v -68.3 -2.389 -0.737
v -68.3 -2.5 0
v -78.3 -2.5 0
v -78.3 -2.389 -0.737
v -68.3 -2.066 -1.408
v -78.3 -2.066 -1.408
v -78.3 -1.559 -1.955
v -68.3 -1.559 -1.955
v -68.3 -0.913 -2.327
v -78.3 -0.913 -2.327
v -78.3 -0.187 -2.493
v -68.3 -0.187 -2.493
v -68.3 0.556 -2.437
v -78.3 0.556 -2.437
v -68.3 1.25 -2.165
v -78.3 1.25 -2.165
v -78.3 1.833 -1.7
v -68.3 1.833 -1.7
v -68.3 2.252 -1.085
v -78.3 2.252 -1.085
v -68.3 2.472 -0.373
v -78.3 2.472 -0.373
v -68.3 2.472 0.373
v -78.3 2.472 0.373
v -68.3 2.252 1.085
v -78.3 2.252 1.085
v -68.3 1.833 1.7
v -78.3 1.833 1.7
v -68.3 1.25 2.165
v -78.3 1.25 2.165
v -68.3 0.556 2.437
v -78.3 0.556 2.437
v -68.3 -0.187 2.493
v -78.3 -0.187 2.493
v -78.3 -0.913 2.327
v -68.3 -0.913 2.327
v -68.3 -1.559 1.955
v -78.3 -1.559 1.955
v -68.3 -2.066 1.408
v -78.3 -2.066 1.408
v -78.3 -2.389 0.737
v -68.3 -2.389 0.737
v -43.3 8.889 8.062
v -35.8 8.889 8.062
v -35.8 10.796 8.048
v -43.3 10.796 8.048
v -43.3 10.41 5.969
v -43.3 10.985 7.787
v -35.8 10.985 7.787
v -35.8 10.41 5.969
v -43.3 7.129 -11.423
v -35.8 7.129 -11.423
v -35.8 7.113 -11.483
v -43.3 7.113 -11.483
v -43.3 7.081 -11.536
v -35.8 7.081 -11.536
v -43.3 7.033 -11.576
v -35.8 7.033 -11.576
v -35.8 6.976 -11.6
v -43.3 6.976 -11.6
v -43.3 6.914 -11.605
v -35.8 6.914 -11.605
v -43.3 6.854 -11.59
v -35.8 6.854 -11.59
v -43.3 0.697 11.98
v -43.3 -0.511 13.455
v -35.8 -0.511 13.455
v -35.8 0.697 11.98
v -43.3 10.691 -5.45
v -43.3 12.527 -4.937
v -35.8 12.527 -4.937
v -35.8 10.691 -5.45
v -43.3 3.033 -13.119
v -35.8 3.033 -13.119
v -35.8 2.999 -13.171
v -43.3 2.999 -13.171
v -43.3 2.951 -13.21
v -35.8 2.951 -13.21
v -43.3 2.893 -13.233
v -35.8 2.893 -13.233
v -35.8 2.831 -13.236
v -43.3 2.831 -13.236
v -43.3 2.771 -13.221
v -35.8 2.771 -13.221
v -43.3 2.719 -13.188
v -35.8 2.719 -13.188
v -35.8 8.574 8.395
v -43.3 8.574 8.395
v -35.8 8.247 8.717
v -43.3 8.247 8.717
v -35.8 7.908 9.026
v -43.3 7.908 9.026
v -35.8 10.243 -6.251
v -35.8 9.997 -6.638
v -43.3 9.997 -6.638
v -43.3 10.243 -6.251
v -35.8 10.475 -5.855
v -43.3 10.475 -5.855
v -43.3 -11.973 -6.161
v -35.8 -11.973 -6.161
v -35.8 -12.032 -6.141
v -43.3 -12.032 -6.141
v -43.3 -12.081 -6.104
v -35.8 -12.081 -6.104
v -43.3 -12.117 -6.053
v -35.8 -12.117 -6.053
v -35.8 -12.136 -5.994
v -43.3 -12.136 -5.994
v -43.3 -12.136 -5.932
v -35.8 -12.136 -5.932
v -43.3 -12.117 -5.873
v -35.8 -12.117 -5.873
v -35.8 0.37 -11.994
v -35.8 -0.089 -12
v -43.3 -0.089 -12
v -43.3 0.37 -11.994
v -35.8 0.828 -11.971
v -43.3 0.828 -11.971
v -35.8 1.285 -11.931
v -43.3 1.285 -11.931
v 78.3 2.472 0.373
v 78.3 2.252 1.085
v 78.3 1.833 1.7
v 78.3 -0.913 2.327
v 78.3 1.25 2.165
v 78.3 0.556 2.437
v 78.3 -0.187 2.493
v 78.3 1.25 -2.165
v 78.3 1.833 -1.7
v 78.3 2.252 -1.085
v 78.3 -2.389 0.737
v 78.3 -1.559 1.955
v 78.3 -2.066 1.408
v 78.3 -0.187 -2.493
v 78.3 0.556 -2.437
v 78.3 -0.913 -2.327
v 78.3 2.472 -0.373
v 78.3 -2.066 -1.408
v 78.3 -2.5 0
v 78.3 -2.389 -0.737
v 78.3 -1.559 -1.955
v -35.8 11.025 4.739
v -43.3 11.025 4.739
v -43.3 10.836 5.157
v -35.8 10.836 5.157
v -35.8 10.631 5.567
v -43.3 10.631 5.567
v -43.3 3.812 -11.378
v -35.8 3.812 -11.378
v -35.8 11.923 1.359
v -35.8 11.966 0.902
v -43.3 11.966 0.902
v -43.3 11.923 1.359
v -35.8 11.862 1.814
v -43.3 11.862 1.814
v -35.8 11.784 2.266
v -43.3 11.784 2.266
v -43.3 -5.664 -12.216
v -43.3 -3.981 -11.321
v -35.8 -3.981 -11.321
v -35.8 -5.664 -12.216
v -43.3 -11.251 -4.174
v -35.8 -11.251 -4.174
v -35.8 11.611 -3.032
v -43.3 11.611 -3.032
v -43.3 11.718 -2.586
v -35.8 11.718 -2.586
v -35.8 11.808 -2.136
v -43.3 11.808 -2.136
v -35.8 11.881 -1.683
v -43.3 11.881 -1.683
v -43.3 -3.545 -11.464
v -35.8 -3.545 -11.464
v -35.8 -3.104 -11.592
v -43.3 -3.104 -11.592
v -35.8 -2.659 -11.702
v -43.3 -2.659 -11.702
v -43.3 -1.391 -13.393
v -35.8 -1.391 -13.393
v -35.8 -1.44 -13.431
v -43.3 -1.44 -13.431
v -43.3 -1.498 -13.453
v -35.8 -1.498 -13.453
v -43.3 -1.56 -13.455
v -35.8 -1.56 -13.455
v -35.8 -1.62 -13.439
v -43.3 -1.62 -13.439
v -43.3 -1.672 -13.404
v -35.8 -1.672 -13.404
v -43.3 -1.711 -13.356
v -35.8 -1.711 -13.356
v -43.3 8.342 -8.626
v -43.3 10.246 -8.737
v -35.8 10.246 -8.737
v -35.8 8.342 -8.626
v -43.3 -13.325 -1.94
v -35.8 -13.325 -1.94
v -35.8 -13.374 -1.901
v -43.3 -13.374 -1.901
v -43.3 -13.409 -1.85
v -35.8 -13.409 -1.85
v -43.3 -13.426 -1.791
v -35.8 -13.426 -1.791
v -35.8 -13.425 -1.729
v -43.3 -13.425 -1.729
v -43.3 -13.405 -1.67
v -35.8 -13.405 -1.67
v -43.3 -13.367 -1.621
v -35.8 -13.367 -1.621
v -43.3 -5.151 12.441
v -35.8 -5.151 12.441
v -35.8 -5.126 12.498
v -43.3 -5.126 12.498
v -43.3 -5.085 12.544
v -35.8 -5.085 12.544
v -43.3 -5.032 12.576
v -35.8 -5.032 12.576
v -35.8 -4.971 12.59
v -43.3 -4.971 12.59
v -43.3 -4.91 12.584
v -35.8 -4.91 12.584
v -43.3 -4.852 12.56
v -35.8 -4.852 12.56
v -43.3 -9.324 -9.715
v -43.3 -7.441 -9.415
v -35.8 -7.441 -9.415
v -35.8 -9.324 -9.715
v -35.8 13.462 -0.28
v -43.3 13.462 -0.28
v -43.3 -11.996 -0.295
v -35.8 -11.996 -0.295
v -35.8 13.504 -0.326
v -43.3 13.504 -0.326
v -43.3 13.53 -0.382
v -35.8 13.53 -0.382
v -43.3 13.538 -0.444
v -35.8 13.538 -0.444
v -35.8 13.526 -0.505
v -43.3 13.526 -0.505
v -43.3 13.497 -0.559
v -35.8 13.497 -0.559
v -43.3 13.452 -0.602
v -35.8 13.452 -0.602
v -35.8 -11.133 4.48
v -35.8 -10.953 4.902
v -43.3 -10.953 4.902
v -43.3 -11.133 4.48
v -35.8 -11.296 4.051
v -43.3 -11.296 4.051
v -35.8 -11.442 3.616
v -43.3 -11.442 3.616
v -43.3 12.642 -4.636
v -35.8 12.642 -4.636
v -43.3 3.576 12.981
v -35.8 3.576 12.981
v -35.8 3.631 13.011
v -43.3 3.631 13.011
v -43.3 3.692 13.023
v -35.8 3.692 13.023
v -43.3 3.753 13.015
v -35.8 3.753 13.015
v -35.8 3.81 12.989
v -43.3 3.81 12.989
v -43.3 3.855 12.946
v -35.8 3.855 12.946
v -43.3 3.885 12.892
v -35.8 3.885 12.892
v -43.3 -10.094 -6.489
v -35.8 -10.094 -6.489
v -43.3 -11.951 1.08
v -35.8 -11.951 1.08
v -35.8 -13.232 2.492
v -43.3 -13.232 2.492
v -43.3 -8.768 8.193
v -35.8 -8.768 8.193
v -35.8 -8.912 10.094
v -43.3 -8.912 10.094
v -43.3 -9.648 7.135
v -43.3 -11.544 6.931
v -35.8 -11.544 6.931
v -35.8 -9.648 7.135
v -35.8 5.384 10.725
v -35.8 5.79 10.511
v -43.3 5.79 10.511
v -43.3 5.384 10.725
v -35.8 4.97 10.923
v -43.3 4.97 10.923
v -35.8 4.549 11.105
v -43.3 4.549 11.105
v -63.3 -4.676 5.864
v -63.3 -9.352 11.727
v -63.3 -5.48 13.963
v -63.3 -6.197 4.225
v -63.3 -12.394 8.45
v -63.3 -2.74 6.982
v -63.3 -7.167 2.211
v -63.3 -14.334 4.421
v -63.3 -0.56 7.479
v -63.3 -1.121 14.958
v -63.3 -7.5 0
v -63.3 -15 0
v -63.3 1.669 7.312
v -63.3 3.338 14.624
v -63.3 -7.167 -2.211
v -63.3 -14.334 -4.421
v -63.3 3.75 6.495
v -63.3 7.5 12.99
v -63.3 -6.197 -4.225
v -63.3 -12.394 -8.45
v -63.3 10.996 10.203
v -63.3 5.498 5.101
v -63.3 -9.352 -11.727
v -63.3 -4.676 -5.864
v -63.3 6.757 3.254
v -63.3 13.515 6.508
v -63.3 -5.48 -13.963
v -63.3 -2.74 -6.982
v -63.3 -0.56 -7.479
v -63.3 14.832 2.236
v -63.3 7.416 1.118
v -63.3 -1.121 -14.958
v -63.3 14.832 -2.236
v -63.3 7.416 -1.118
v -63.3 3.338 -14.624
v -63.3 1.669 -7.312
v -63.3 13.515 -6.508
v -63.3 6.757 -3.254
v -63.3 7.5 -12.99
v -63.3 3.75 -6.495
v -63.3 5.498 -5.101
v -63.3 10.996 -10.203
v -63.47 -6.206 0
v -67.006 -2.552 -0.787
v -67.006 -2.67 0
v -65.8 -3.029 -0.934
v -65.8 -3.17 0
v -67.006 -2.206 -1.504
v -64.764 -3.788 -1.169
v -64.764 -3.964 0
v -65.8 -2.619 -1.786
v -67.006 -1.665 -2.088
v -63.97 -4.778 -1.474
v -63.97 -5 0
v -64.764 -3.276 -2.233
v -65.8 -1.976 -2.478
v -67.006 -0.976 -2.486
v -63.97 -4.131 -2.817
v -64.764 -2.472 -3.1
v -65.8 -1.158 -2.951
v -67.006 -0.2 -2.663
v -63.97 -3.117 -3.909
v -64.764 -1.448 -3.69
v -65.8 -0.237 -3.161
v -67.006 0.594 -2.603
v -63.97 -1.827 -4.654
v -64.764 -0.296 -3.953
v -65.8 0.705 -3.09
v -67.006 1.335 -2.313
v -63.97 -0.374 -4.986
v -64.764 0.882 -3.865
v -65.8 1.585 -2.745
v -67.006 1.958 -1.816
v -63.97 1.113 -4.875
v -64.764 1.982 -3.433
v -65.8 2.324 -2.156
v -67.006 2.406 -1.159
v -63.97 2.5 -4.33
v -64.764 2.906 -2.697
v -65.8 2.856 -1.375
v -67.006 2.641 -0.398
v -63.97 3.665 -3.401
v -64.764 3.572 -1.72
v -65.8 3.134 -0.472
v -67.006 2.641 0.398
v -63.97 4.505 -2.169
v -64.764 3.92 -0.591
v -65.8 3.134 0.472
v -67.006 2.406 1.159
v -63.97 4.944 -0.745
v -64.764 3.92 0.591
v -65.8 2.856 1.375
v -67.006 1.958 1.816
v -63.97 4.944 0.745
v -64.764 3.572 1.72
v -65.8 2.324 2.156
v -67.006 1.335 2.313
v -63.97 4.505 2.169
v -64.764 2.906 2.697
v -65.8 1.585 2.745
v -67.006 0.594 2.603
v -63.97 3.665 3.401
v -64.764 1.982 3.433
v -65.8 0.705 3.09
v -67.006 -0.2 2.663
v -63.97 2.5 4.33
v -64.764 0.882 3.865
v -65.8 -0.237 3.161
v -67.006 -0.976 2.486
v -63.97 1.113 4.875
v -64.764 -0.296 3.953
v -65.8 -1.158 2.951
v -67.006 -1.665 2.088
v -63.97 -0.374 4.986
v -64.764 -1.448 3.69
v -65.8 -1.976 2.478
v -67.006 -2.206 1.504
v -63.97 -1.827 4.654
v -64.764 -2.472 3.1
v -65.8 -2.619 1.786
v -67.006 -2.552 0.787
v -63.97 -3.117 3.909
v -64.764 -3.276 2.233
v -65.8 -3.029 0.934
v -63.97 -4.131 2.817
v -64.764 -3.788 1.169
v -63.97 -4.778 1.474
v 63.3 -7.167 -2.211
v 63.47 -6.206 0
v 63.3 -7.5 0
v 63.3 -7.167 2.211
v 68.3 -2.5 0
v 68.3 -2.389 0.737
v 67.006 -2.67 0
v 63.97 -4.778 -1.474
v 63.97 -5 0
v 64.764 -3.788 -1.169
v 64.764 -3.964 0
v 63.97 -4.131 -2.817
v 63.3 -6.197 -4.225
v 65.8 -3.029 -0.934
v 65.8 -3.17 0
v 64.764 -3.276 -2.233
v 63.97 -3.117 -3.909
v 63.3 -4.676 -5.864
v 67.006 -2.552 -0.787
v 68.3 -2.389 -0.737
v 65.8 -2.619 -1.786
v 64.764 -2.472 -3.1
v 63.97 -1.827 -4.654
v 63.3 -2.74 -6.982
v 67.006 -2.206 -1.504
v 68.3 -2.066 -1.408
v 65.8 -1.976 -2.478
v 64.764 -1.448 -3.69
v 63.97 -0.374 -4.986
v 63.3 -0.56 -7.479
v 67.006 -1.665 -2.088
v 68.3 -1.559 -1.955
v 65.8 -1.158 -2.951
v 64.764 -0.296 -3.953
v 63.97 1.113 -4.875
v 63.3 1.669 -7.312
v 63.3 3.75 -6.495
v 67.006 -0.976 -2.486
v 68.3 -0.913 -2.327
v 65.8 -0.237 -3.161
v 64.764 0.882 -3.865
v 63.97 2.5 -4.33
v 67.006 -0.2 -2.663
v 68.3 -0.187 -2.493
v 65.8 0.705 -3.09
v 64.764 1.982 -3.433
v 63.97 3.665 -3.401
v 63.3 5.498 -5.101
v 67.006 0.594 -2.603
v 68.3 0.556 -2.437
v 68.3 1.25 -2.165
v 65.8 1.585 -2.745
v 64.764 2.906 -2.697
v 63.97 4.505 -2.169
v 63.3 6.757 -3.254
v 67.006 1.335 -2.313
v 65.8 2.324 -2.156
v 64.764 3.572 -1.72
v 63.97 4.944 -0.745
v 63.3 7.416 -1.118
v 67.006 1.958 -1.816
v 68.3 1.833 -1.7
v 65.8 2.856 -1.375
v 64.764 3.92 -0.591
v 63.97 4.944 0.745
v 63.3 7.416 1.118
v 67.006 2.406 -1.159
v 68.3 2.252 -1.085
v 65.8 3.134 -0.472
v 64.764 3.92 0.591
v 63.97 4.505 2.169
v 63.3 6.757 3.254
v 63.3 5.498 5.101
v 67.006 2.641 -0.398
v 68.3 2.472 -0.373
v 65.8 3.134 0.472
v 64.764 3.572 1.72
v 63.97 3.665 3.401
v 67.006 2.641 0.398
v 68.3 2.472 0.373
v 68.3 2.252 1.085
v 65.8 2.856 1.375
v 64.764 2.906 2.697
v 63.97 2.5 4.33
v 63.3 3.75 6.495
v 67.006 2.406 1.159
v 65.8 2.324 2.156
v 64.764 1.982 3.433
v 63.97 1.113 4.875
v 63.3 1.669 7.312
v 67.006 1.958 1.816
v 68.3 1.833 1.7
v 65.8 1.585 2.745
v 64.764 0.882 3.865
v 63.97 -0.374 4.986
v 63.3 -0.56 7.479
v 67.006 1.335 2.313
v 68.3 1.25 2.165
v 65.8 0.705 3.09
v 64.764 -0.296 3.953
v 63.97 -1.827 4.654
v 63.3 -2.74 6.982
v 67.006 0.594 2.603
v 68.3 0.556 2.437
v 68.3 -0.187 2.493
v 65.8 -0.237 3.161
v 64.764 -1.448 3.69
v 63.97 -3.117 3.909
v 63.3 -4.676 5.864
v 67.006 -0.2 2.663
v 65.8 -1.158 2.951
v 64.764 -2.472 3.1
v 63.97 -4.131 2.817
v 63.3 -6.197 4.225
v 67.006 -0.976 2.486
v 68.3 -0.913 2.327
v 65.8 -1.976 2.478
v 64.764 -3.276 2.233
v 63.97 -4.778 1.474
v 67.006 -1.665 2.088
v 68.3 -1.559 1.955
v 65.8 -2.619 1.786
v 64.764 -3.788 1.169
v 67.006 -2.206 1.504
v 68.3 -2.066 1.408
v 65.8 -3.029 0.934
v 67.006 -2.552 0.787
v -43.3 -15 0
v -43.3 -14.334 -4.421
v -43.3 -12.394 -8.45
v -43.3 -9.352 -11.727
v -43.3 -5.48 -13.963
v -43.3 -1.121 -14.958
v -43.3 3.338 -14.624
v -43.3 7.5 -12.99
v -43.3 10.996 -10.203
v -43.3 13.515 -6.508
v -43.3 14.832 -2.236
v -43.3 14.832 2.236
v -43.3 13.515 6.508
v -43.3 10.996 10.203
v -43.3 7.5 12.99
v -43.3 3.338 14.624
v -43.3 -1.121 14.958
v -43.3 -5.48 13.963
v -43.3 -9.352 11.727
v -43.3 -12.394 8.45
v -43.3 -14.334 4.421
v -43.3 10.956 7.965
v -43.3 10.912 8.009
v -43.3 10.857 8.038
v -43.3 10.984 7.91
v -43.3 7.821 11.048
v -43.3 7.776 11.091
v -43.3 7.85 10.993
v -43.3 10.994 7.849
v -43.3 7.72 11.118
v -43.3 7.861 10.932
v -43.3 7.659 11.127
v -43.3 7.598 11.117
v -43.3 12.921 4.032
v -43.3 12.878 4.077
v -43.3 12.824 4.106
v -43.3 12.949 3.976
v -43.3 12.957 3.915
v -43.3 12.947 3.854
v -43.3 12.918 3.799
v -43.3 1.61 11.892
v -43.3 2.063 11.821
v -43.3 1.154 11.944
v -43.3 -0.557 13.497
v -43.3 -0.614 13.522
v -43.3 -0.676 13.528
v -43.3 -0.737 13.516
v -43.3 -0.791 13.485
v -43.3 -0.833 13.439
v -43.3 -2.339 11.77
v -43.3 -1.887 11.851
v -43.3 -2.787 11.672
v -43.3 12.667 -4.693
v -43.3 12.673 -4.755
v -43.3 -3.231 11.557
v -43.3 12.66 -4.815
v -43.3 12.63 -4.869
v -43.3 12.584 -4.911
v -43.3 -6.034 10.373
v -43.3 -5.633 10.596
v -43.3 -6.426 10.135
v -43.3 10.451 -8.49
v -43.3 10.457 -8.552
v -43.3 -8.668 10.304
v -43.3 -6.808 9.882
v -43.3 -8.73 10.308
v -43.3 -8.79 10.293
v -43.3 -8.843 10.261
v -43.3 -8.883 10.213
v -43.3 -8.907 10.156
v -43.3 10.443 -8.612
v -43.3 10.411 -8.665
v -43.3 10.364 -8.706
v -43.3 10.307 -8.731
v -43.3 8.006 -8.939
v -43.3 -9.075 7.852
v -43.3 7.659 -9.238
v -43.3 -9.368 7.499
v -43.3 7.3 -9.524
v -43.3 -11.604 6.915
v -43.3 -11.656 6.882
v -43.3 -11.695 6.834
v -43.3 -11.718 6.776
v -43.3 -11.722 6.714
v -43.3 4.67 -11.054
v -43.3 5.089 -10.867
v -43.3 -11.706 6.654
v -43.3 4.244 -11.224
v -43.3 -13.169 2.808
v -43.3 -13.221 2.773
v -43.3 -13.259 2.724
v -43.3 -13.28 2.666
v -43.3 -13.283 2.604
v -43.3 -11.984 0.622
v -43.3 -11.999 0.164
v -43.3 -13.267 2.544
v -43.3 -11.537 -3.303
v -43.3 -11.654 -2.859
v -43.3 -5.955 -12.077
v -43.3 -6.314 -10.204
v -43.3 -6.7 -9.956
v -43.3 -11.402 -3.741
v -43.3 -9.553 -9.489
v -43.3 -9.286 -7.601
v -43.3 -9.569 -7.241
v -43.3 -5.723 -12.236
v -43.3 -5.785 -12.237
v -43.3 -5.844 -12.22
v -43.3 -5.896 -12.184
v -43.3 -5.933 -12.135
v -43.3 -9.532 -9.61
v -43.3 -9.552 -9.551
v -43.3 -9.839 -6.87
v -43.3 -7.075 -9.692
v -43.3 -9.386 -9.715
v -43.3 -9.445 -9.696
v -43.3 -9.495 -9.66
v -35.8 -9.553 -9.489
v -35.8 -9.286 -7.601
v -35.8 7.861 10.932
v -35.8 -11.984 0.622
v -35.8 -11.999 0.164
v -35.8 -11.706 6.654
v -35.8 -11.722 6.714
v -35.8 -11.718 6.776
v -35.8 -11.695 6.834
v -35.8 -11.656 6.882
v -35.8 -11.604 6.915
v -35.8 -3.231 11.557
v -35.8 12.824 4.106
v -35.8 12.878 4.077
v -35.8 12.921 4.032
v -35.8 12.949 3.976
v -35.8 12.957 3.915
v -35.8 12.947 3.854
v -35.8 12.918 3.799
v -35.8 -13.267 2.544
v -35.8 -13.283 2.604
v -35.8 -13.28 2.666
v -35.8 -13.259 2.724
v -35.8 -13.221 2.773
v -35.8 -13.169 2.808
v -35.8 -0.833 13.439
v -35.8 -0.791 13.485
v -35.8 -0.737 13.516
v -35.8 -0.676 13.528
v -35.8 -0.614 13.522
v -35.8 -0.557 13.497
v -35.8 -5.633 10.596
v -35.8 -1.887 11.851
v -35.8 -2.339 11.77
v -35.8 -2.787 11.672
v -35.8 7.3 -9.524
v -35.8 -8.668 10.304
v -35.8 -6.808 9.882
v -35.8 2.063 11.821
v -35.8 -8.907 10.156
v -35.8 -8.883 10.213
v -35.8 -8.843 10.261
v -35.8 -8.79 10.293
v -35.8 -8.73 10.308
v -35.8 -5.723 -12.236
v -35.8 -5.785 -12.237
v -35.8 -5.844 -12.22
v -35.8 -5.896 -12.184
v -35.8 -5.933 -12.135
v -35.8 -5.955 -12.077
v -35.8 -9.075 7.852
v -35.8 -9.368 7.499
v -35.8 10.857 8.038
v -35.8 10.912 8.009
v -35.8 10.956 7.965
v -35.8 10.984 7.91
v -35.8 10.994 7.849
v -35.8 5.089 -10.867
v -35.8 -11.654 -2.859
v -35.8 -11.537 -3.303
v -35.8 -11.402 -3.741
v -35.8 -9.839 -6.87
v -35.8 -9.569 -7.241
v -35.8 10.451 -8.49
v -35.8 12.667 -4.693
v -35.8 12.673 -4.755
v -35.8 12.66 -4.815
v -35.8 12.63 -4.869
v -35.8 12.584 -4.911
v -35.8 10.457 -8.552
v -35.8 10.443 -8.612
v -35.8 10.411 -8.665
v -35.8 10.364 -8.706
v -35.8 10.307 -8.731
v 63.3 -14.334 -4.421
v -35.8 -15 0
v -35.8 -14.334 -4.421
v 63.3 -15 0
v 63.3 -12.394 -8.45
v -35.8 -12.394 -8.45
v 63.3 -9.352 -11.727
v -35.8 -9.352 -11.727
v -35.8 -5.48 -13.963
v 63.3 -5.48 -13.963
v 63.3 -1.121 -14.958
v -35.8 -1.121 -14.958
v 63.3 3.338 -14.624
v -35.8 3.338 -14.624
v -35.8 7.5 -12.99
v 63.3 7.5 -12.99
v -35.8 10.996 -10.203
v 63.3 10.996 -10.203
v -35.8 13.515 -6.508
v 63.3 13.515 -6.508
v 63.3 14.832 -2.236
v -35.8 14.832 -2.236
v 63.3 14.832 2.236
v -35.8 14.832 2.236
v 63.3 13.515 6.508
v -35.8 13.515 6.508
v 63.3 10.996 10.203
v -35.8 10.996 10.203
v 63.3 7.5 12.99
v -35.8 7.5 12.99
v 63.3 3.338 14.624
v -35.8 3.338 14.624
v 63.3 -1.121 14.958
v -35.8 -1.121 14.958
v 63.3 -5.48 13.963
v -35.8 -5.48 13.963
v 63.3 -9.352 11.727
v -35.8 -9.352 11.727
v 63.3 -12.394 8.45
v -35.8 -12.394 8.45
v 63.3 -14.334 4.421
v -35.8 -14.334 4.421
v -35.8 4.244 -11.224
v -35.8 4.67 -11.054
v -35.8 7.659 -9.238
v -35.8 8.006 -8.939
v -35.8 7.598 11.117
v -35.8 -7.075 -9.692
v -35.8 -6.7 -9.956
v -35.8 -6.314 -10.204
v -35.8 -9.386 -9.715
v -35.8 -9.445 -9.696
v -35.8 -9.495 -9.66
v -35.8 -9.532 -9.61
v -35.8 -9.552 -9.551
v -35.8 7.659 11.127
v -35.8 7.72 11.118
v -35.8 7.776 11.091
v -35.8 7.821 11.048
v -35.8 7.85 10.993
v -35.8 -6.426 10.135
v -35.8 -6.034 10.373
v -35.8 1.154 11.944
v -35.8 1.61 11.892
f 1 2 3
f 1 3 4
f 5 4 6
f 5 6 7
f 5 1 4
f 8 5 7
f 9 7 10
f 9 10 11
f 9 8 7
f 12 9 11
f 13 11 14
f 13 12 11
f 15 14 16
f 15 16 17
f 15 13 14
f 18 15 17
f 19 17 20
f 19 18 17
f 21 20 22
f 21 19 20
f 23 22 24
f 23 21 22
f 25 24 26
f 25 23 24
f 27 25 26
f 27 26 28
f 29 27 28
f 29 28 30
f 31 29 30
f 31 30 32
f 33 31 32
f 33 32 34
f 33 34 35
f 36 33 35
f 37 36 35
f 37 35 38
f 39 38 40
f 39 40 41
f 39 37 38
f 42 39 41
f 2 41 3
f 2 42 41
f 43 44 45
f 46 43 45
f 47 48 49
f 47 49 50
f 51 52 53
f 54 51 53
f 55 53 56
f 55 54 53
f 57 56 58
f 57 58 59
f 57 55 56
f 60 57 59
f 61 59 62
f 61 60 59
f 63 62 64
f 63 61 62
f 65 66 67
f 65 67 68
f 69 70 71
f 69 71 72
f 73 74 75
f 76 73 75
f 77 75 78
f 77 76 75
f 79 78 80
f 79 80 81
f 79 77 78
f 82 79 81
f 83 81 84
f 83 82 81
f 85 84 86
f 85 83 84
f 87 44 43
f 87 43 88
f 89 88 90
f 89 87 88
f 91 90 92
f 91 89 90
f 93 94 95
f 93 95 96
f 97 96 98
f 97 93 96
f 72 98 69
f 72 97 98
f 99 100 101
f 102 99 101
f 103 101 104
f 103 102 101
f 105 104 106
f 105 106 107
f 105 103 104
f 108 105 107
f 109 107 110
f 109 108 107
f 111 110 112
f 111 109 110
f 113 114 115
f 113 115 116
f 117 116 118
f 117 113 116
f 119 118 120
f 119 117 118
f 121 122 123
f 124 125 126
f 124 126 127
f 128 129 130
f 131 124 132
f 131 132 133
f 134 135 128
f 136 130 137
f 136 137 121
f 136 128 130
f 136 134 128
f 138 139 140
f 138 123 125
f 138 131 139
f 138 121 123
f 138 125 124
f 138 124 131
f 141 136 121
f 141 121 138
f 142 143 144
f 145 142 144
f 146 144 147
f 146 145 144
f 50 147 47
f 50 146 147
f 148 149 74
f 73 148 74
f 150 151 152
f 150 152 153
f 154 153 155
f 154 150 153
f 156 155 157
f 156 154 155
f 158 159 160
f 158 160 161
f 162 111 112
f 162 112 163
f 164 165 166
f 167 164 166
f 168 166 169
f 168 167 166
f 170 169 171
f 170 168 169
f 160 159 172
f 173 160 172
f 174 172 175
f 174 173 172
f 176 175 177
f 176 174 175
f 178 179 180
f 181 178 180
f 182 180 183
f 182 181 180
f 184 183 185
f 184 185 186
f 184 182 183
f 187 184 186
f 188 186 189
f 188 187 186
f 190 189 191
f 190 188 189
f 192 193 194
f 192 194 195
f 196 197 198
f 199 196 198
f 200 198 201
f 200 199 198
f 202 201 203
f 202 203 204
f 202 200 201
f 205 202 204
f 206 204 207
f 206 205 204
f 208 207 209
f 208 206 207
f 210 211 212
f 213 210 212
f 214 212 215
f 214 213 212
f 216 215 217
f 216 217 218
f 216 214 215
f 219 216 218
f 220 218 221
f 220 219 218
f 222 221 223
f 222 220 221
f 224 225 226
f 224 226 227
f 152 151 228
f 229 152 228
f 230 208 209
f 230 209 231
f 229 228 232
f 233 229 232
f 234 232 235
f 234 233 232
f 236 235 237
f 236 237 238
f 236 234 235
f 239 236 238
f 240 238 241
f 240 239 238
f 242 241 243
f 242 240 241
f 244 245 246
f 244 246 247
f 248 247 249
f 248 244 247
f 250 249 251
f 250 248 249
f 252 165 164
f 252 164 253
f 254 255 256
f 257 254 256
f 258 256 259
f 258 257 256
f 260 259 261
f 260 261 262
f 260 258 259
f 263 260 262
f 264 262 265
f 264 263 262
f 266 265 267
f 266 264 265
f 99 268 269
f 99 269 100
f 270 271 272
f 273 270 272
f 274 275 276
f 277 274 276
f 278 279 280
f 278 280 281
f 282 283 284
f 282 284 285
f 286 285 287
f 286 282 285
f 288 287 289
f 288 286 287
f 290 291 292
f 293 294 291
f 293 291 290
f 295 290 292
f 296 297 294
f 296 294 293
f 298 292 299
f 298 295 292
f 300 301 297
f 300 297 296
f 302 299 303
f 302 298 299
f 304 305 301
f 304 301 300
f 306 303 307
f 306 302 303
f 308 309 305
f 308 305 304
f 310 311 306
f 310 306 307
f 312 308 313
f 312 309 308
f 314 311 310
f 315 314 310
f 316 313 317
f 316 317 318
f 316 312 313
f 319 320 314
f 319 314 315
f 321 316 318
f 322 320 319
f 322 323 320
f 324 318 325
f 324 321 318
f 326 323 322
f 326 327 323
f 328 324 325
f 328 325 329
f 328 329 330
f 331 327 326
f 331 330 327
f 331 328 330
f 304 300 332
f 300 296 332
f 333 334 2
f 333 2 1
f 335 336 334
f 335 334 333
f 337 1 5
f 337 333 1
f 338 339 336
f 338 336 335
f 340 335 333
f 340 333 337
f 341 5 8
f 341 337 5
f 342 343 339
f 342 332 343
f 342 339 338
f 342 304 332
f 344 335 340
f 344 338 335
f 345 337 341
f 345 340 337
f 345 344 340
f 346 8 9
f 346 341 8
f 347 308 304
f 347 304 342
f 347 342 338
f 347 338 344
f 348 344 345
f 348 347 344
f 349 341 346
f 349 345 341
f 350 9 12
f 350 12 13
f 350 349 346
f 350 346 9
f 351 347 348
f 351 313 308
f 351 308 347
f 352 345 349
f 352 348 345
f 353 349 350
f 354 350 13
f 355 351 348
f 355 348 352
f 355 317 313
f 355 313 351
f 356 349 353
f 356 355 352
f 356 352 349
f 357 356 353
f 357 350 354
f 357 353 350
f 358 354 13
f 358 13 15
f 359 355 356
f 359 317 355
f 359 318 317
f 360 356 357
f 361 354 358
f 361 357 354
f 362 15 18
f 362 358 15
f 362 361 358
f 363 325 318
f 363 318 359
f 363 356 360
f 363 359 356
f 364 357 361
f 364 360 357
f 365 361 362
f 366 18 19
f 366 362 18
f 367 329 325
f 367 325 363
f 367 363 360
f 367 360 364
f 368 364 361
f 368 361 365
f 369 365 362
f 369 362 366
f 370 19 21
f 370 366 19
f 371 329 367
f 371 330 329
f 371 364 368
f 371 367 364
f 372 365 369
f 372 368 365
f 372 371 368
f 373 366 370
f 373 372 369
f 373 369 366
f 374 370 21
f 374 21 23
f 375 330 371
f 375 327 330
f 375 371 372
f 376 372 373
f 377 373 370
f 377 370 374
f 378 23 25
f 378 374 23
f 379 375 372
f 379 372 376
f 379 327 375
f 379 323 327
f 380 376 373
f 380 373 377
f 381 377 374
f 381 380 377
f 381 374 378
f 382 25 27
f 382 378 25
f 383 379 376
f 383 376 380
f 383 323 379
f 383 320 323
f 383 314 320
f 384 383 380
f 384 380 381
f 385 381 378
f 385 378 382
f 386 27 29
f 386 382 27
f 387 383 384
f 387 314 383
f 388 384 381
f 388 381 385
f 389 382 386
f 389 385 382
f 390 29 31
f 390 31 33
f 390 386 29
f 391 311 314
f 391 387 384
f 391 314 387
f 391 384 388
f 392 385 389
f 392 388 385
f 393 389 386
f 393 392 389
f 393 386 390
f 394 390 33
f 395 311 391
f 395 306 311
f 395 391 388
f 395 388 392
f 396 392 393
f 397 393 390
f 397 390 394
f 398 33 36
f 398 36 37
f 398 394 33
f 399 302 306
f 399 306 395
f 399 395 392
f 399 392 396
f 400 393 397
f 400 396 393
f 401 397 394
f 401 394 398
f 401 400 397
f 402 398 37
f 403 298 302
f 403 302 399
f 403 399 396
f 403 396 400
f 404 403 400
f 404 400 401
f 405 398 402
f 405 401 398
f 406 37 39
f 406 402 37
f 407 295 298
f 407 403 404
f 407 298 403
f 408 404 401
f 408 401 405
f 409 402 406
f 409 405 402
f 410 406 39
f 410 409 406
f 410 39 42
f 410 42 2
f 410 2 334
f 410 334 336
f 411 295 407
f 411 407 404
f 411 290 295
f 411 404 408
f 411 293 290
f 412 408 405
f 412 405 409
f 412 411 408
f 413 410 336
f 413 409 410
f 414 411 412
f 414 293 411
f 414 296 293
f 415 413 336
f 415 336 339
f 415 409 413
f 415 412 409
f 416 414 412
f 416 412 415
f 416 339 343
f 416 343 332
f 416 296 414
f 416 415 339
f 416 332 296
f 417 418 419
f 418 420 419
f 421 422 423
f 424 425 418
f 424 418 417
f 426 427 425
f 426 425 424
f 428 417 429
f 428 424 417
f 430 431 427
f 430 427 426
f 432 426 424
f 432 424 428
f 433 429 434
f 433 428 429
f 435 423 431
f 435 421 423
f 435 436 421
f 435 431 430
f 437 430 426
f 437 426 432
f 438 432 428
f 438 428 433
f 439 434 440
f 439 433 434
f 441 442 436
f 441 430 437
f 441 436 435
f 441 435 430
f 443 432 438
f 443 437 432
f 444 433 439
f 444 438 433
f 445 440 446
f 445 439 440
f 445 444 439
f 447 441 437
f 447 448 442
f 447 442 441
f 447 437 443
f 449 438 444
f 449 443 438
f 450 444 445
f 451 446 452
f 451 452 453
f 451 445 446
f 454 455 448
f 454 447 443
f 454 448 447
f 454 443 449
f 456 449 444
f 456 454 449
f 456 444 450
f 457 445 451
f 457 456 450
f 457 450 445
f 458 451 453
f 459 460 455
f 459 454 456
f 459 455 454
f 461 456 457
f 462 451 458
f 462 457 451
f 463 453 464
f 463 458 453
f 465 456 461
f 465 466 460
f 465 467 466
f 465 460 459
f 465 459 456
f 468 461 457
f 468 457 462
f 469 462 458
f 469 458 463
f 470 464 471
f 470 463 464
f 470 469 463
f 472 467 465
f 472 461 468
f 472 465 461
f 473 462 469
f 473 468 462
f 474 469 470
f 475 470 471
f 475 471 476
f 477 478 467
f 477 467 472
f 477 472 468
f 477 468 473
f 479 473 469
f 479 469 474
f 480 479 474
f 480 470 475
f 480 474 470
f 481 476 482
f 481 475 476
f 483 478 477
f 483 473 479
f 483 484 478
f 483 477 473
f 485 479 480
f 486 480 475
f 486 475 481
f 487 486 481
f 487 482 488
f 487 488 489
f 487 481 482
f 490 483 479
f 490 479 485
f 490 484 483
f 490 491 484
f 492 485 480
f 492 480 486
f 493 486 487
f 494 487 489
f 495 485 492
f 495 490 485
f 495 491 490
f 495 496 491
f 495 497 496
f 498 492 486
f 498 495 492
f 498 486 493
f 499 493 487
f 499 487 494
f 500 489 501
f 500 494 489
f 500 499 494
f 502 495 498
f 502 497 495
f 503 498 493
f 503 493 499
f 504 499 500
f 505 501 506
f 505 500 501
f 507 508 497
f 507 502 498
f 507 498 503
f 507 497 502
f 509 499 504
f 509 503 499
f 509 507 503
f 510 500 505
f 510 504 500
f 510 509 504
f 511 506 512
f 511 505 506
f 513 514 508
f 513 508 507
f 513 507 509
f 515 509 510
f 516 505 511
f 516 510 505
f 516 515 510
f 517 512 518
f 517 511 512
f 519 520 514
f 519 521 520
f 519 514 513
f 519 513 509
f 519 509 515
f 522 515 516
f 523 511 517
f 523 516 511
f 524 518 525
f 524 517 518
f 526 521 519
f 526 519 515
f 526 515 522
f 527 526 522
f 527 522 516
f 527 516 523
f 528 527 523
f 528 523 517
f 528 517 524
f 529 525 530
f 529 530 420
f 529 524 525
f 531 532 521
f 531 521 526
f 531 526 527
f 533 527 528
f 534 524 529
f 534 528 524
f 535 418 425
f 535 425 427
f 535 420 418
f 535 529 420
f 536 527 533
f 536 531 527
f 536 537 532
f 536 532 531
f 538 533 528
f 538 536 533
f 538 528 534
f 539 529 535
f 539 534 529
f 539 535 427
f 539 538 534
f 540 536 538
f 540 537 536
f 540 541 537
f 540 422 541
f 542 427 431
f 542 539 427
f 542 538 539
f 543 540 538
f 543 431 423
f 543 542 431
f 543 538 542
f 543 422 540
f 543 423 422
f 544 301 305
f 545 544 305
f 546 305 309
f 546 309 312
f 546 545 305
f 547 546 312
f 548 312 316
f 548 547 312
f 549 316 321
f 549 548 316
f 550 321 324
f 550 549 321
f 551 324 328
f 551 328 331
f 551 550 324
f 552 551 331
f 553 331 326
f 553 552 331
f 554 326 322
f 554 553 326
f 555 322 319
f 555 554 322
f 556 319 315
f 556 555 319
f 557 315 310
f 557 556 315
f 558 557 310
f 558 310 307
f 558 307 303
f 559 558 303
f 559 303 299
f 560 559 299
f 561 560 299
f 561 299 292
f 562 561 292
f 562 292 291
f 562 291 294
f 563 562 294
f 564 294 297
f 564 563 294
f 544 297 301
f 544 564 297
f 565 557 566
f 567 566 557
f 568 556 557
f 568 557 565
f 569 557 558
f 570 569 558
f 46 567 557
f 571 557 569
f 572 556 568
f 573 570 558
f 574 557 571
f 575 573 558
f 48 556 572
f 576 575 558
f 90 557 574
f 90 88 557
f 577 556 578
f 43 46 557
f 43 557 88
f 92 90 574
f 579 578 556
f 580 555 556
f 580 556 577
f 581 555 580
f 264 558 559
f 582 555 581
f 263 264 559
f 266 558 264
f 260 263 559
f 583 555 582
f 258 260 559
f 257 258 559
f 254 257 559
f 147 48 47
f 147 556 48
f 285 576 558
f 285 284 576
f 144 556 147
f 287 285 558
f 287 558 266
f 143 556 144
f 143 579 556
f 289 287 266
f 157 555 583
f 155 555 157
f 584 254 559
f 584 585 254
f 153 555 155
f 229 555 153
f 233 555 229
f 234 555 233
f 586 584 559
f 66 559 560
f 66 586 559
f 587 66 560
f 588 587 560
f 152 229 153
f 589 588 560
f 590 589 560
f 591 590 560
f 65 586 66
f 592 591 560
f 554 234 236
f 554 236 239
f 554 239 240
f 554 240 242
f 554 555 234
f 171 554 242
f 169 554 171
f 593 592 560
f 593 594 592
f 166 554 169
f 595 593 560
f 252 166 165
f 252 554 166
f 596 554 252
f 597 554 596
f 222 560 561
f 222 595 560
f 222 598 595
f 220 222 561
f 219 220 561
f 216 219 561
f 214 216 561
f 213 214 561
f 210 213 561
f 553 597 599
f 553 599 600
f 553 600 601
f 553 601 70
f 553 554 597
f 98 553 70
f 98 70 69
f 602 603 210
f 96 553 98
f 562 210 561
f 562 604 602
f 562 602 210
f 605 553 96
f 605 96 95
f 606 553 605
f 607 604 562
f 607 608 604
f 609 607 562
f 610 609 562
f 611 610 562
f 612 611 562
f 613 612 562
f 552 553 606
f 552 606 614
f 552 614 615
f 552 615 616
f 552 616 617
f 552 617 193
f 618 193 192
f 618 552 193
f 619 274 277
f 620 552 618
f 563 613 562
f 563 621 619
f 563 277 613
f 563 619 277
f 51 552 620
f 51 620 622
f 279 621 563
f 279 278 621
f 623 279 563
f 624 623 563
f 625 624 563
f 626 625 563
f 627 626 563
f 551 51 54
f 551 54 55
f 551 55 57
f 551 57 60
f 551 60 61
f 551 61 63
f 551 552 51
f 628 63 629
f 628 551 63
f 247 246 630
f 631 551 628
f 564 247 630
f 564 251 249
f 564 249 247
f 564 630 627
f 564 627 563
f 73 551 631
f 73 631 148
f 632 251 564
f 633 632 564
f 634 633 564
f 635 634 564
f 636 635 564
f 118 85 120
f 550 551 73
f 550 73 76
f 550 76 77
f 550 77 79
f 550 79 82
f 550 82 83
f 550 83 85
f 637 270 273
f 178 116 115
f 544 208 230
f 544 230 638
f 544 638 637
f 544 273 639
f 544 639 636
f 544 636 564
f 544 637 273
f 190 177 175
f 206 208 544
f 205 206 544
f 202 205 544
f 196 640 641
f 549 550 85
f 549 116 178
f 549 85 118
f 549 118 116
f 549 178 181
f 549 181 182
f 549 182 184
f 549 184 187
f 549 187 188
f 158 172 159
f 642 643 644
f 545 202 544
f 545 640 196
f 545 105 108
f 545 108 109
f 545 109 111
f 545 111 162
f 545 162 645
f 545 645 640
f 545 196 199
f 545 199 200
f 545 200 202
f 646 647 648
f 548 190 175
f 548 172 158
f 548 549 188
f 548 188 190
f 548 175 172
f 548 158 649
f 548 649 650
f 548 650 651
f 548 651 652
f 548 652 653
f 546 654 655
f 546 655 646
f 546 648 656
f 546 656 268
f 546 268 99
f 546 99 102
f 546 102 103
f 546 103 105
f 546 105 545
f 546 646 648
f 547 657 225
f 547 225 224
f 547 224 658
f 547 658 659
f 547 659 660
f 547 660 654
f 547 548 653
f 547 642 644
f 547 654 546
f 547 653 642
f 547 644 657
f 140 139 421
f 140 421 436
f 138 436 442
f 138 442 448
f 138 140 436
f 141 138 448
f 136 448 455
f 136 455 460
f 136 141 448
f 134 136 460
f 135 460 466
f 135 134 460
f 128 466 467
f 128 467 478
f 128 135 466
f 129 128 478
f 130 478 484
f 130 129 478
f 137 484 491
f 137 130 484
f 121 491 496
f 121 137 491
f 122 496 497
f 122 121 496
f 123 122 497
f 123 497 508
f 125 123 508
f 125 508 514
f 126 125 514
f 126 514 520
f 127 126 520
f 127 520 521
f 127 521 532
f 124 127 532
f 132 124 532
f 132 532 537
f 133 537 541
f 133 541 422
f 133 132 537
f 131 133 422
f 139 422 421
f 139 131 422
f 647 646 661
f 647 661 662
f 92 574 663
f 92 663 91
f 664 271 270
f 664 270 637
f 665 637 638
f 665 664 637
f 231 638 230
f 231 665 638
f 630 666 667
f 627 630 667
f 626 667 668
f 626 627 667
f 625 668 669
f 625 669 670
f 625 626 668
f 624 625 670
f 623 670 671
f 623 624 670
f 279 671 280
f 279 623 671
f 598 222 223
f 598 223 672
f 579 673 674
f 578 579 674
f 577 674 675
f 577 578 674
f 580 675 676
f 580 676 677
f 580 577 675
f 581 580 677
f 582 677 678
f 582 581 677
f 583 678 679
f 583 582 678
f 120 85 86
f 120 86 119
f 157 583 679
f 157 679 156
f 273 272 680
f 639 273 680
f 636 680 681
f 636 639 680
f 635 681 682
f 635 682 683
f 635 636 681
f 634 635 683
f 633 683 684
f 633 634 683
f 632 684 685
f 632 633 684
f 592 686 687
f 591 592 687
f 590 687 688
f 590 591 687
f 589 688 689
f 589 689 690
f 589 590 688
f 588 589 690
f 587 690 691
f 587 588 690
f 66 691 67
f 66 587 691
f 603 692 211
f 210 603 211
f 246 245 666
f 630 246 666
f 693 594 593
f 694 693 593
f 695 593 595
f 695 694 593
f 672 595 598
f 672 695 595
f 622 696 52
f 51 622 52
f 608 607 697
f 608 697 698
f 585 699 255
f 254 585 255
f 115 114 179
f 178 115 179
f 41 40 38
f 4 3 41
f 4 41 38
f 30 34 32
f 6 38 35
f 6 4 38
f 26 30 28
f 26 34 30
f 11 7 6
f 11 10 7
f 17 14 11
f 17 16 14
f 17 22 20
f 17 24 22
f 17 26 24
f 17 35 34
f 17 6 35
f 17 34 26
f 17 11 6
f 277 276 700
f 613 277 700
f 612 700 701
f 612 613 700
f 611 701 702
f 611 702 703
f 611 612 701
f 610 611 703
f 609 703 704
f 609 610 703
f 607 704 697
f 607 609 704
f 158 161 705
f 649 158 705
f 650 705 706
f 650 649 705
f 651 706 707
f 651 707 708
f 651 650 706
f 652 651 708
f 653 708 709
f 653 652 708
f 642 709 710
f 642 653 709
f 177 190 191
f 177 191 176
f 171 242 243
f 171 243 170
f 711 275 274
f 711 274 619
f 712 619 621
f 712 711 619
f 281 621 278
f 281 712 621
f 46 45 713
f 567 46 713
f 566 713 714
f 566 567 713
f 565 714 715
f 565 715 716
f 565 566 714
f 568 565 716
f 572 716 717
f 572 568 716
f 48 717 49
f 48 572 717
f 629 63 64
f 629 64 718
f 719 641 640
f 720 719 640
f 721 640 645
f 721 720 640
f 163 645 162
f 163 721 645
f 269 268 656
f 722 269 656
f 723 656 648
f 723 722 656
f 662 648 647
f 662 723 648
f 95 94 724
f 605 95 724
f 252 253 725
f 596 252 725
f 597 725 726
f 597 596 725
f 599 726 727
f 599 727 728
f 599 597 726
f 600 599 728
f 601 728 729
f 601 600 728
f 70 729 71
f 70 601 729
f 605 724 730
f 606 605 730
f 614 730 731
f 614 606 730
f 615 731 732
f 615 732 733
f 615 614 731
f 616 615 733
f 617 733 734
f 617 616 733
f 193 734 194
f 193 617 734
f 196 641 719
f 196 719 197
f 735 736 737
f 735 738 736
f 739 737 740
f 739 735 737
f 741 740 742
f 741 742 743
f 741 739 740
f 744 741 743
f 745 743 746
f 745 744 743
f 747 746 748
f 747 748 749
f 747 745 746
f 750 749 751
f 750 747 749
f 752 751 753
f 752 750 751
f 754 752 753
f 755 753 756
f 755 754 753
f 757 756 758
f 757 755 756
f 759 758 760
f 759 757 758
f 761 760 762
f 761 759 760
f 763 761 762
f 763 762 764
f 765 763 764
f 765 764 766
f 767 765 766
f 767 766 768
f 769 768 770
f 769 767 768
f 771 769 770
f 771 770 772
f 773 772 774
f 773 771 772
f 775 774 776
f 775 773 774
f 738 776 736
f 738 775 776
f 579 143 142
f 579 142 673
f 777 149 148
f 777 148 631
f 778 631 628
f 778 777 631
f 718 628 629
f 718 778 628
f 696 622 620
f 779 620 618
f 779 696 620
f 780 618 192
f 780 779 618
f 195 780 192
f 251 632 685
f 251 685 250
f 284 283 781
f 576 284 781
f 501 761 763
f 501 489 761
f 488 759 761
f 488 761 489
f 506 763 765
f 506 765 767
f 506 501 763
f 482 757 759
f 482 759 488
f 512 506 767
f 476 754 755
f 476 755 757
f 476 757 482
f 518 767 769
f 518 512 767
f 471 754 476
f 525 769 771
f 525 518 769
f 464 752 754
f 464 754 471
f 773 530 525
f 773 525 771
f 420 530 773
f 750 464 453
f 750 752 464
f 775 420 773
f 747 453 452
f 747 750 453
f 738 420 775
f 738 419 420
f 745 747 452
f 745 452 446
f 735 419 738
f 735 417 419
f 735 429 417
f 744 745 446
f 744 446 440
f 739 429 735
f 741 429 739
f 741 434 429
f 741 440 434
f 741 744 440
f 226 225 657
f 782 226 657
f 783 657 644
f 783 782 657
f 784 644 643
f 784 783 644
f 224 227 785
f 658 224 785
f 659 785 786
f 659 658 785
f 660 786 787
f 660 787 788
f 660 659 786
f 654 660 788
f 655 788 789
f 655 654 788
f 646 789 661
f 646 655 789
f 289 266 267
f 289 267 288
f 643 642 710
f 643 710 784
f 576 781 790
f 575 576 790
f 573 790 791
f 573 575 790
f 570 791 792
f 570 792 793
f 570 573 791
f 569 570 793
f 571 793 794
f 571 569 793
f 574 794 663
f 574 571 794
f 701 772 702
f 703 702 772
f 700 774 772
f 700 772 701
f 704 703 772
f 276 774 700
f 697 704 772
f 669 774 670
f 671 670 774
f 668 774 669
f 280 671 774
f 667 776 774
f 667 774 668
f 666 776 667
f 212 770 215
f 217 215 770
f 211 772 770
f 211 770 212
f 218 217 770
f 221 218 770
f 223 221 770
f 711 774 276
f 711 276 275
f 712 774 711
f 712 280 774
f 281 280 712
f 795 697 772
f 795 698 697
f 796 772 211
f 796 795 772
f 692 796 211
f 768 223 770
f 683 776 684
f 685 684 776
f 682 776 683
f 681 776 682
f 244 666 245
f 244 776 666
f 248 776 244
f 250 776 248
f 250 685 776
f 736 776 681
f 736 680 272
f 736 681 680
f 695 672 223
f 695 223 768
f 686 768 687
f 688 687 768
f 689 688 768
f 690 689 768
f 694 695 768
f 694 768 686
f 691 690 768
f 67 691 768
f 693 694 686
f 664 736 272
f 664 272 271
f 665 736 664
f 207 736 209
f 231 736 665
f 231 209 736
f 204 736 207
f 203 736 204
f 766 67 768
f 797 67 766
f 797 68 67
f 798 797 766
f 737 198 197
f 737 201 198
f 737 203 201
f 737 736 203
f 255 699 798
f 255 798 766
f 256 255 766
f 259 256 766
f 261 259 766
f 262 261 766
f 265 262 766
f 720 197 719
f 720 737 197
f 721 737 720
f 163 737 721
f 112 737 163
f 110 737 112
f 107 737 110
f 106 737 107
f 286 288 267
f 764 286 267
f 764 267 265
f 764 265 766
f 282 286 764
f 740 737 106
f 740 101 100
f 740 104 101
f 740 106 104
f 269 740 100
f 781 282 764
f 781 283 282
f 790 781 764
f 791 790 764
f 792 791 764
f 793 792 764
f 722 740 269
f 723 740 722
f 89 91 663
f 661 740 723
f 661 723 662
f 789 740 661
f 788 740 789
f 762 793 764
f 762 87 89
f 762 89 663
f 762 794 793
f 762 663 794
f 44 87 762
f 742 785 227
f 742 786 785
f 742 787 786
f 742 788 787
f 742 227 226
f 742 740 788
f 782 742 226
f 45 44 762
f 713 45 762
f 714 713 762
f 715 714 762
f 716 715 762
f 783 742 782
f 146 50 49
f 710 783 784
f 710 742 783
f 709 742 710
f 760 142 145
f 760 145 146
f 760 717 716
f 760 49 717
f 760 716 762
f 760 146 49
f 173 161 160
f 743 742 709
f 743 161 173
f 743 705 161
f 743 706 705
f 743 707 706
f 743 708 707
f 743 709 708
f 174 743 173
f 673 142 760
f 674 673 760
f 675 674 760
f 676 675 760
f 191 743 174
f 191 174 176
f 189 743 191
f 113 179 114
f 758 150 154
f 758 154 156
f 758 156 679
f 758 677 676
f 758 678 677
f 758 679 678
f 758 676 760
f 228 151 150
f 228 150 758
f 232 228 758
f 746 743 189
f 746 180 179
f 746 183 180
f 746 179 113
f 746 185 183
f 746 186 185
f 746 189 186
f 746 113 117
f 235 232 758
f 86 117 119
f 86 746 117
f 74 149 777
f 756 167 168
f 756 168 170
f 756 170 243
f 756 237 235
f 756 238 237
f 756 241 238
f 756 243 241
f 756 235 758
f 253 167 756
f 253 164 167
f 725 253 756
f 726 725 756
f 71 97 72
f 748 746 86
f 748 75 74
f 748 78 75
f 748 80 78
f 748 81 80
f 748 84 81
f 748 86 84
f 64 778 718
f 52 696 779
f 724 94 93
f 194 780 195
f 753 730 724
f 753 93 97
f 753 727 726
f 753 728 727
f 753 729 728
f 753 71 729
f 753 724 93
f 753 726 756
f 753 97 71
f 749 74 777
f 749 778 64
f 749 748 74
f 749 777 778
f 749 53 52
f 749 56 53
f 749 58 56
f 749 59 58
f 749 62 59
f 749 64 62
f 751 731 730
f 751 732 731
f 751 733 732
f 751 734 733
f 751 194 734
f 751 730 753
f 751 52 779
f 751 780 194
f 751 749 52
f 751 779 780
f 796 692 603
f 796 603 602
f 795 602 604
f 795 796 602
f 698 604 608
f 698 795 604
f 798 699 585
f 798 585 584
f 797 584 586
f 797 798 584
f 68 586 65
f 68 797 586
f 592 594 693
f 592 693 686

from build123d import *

# Parameters (mm, degrees)
CONG_1_R                     = 5
BOSS_EXTRU_1_DEPTH           = 7.5
R_P_TITION_CIRCULAIRE1_COUNT = 19


with BuildPart() as part:
    # Esquisse1 → Révolution1 (revolve)
    with BuildSketch(Plane.XY, mode=Mode.PRIVATE) as r_volution1_sk:
        Polygon((-78.3, 0), (-78.3, 2.5), (-63.3, 2.5), (-63.3, 15), (-43.3, 15), (-43.3, 12), (-35.8, 12), (-35.8, 15), (63.3, 15), (63.3, 2.5), (78.3, 2.5), (78.3, 0), align=None)
    revolve(r_volution1_sk.sketch.rotate(Axis((-78.3, 0, 0), (1, 0, 0)), 180), axis=Axis((-78.3, 0, 0), (1, 0, 0)))

    # Congé1
    cong_1_edges = [part.edges().sort_by_distance(p)[0] for p in [
        (63.3, 2.5, 0),
        (-63.3, 2.5, 0),
    ]]
    fillet(cong_1_edges, radius=CONG_1_R)

    # Esquisse3 → Boss.-Extru.1 (add)
    with BuildSketch(Plane(origin=(-43.3, 0, 0), x_dir=(0, 0, -1), z_dir=(1, 0, 0))):
        with BuildLine():
            Line((0.601733572, 13.451614371), (2.134408168, 11.226678946))
            Line((2.134408168, 11.226678946), (-1.394925929, 11.342318989))
            Line((-1.394925929, 11.342318989), (0.280106761, 13.462152602))
            ThreePointArc((0.280106761, 13.462152602), (0.443579587, 13.538049), (0.601733572, 13.451614371))
        make_face()
    boss_extru_1 = extrude(amount=BOSS_EXTRU_1_DEPTH)

    # Répétition circulaire1: Boss.-Extru.1 ×19 about axis
    r_p_tition_circulaire1_axis = Axis((0, 0, 0), (1, 0, 0))
    for i in range(1, R_P_TITION_CIRCULAIRE1_COUNT):
        add(boss_extru_1.rotate(r_p_tition_circulaire1_axis, i * 360 / R_P_TITION_CIRCULAIRE1_COUNT))


solid = part.part
